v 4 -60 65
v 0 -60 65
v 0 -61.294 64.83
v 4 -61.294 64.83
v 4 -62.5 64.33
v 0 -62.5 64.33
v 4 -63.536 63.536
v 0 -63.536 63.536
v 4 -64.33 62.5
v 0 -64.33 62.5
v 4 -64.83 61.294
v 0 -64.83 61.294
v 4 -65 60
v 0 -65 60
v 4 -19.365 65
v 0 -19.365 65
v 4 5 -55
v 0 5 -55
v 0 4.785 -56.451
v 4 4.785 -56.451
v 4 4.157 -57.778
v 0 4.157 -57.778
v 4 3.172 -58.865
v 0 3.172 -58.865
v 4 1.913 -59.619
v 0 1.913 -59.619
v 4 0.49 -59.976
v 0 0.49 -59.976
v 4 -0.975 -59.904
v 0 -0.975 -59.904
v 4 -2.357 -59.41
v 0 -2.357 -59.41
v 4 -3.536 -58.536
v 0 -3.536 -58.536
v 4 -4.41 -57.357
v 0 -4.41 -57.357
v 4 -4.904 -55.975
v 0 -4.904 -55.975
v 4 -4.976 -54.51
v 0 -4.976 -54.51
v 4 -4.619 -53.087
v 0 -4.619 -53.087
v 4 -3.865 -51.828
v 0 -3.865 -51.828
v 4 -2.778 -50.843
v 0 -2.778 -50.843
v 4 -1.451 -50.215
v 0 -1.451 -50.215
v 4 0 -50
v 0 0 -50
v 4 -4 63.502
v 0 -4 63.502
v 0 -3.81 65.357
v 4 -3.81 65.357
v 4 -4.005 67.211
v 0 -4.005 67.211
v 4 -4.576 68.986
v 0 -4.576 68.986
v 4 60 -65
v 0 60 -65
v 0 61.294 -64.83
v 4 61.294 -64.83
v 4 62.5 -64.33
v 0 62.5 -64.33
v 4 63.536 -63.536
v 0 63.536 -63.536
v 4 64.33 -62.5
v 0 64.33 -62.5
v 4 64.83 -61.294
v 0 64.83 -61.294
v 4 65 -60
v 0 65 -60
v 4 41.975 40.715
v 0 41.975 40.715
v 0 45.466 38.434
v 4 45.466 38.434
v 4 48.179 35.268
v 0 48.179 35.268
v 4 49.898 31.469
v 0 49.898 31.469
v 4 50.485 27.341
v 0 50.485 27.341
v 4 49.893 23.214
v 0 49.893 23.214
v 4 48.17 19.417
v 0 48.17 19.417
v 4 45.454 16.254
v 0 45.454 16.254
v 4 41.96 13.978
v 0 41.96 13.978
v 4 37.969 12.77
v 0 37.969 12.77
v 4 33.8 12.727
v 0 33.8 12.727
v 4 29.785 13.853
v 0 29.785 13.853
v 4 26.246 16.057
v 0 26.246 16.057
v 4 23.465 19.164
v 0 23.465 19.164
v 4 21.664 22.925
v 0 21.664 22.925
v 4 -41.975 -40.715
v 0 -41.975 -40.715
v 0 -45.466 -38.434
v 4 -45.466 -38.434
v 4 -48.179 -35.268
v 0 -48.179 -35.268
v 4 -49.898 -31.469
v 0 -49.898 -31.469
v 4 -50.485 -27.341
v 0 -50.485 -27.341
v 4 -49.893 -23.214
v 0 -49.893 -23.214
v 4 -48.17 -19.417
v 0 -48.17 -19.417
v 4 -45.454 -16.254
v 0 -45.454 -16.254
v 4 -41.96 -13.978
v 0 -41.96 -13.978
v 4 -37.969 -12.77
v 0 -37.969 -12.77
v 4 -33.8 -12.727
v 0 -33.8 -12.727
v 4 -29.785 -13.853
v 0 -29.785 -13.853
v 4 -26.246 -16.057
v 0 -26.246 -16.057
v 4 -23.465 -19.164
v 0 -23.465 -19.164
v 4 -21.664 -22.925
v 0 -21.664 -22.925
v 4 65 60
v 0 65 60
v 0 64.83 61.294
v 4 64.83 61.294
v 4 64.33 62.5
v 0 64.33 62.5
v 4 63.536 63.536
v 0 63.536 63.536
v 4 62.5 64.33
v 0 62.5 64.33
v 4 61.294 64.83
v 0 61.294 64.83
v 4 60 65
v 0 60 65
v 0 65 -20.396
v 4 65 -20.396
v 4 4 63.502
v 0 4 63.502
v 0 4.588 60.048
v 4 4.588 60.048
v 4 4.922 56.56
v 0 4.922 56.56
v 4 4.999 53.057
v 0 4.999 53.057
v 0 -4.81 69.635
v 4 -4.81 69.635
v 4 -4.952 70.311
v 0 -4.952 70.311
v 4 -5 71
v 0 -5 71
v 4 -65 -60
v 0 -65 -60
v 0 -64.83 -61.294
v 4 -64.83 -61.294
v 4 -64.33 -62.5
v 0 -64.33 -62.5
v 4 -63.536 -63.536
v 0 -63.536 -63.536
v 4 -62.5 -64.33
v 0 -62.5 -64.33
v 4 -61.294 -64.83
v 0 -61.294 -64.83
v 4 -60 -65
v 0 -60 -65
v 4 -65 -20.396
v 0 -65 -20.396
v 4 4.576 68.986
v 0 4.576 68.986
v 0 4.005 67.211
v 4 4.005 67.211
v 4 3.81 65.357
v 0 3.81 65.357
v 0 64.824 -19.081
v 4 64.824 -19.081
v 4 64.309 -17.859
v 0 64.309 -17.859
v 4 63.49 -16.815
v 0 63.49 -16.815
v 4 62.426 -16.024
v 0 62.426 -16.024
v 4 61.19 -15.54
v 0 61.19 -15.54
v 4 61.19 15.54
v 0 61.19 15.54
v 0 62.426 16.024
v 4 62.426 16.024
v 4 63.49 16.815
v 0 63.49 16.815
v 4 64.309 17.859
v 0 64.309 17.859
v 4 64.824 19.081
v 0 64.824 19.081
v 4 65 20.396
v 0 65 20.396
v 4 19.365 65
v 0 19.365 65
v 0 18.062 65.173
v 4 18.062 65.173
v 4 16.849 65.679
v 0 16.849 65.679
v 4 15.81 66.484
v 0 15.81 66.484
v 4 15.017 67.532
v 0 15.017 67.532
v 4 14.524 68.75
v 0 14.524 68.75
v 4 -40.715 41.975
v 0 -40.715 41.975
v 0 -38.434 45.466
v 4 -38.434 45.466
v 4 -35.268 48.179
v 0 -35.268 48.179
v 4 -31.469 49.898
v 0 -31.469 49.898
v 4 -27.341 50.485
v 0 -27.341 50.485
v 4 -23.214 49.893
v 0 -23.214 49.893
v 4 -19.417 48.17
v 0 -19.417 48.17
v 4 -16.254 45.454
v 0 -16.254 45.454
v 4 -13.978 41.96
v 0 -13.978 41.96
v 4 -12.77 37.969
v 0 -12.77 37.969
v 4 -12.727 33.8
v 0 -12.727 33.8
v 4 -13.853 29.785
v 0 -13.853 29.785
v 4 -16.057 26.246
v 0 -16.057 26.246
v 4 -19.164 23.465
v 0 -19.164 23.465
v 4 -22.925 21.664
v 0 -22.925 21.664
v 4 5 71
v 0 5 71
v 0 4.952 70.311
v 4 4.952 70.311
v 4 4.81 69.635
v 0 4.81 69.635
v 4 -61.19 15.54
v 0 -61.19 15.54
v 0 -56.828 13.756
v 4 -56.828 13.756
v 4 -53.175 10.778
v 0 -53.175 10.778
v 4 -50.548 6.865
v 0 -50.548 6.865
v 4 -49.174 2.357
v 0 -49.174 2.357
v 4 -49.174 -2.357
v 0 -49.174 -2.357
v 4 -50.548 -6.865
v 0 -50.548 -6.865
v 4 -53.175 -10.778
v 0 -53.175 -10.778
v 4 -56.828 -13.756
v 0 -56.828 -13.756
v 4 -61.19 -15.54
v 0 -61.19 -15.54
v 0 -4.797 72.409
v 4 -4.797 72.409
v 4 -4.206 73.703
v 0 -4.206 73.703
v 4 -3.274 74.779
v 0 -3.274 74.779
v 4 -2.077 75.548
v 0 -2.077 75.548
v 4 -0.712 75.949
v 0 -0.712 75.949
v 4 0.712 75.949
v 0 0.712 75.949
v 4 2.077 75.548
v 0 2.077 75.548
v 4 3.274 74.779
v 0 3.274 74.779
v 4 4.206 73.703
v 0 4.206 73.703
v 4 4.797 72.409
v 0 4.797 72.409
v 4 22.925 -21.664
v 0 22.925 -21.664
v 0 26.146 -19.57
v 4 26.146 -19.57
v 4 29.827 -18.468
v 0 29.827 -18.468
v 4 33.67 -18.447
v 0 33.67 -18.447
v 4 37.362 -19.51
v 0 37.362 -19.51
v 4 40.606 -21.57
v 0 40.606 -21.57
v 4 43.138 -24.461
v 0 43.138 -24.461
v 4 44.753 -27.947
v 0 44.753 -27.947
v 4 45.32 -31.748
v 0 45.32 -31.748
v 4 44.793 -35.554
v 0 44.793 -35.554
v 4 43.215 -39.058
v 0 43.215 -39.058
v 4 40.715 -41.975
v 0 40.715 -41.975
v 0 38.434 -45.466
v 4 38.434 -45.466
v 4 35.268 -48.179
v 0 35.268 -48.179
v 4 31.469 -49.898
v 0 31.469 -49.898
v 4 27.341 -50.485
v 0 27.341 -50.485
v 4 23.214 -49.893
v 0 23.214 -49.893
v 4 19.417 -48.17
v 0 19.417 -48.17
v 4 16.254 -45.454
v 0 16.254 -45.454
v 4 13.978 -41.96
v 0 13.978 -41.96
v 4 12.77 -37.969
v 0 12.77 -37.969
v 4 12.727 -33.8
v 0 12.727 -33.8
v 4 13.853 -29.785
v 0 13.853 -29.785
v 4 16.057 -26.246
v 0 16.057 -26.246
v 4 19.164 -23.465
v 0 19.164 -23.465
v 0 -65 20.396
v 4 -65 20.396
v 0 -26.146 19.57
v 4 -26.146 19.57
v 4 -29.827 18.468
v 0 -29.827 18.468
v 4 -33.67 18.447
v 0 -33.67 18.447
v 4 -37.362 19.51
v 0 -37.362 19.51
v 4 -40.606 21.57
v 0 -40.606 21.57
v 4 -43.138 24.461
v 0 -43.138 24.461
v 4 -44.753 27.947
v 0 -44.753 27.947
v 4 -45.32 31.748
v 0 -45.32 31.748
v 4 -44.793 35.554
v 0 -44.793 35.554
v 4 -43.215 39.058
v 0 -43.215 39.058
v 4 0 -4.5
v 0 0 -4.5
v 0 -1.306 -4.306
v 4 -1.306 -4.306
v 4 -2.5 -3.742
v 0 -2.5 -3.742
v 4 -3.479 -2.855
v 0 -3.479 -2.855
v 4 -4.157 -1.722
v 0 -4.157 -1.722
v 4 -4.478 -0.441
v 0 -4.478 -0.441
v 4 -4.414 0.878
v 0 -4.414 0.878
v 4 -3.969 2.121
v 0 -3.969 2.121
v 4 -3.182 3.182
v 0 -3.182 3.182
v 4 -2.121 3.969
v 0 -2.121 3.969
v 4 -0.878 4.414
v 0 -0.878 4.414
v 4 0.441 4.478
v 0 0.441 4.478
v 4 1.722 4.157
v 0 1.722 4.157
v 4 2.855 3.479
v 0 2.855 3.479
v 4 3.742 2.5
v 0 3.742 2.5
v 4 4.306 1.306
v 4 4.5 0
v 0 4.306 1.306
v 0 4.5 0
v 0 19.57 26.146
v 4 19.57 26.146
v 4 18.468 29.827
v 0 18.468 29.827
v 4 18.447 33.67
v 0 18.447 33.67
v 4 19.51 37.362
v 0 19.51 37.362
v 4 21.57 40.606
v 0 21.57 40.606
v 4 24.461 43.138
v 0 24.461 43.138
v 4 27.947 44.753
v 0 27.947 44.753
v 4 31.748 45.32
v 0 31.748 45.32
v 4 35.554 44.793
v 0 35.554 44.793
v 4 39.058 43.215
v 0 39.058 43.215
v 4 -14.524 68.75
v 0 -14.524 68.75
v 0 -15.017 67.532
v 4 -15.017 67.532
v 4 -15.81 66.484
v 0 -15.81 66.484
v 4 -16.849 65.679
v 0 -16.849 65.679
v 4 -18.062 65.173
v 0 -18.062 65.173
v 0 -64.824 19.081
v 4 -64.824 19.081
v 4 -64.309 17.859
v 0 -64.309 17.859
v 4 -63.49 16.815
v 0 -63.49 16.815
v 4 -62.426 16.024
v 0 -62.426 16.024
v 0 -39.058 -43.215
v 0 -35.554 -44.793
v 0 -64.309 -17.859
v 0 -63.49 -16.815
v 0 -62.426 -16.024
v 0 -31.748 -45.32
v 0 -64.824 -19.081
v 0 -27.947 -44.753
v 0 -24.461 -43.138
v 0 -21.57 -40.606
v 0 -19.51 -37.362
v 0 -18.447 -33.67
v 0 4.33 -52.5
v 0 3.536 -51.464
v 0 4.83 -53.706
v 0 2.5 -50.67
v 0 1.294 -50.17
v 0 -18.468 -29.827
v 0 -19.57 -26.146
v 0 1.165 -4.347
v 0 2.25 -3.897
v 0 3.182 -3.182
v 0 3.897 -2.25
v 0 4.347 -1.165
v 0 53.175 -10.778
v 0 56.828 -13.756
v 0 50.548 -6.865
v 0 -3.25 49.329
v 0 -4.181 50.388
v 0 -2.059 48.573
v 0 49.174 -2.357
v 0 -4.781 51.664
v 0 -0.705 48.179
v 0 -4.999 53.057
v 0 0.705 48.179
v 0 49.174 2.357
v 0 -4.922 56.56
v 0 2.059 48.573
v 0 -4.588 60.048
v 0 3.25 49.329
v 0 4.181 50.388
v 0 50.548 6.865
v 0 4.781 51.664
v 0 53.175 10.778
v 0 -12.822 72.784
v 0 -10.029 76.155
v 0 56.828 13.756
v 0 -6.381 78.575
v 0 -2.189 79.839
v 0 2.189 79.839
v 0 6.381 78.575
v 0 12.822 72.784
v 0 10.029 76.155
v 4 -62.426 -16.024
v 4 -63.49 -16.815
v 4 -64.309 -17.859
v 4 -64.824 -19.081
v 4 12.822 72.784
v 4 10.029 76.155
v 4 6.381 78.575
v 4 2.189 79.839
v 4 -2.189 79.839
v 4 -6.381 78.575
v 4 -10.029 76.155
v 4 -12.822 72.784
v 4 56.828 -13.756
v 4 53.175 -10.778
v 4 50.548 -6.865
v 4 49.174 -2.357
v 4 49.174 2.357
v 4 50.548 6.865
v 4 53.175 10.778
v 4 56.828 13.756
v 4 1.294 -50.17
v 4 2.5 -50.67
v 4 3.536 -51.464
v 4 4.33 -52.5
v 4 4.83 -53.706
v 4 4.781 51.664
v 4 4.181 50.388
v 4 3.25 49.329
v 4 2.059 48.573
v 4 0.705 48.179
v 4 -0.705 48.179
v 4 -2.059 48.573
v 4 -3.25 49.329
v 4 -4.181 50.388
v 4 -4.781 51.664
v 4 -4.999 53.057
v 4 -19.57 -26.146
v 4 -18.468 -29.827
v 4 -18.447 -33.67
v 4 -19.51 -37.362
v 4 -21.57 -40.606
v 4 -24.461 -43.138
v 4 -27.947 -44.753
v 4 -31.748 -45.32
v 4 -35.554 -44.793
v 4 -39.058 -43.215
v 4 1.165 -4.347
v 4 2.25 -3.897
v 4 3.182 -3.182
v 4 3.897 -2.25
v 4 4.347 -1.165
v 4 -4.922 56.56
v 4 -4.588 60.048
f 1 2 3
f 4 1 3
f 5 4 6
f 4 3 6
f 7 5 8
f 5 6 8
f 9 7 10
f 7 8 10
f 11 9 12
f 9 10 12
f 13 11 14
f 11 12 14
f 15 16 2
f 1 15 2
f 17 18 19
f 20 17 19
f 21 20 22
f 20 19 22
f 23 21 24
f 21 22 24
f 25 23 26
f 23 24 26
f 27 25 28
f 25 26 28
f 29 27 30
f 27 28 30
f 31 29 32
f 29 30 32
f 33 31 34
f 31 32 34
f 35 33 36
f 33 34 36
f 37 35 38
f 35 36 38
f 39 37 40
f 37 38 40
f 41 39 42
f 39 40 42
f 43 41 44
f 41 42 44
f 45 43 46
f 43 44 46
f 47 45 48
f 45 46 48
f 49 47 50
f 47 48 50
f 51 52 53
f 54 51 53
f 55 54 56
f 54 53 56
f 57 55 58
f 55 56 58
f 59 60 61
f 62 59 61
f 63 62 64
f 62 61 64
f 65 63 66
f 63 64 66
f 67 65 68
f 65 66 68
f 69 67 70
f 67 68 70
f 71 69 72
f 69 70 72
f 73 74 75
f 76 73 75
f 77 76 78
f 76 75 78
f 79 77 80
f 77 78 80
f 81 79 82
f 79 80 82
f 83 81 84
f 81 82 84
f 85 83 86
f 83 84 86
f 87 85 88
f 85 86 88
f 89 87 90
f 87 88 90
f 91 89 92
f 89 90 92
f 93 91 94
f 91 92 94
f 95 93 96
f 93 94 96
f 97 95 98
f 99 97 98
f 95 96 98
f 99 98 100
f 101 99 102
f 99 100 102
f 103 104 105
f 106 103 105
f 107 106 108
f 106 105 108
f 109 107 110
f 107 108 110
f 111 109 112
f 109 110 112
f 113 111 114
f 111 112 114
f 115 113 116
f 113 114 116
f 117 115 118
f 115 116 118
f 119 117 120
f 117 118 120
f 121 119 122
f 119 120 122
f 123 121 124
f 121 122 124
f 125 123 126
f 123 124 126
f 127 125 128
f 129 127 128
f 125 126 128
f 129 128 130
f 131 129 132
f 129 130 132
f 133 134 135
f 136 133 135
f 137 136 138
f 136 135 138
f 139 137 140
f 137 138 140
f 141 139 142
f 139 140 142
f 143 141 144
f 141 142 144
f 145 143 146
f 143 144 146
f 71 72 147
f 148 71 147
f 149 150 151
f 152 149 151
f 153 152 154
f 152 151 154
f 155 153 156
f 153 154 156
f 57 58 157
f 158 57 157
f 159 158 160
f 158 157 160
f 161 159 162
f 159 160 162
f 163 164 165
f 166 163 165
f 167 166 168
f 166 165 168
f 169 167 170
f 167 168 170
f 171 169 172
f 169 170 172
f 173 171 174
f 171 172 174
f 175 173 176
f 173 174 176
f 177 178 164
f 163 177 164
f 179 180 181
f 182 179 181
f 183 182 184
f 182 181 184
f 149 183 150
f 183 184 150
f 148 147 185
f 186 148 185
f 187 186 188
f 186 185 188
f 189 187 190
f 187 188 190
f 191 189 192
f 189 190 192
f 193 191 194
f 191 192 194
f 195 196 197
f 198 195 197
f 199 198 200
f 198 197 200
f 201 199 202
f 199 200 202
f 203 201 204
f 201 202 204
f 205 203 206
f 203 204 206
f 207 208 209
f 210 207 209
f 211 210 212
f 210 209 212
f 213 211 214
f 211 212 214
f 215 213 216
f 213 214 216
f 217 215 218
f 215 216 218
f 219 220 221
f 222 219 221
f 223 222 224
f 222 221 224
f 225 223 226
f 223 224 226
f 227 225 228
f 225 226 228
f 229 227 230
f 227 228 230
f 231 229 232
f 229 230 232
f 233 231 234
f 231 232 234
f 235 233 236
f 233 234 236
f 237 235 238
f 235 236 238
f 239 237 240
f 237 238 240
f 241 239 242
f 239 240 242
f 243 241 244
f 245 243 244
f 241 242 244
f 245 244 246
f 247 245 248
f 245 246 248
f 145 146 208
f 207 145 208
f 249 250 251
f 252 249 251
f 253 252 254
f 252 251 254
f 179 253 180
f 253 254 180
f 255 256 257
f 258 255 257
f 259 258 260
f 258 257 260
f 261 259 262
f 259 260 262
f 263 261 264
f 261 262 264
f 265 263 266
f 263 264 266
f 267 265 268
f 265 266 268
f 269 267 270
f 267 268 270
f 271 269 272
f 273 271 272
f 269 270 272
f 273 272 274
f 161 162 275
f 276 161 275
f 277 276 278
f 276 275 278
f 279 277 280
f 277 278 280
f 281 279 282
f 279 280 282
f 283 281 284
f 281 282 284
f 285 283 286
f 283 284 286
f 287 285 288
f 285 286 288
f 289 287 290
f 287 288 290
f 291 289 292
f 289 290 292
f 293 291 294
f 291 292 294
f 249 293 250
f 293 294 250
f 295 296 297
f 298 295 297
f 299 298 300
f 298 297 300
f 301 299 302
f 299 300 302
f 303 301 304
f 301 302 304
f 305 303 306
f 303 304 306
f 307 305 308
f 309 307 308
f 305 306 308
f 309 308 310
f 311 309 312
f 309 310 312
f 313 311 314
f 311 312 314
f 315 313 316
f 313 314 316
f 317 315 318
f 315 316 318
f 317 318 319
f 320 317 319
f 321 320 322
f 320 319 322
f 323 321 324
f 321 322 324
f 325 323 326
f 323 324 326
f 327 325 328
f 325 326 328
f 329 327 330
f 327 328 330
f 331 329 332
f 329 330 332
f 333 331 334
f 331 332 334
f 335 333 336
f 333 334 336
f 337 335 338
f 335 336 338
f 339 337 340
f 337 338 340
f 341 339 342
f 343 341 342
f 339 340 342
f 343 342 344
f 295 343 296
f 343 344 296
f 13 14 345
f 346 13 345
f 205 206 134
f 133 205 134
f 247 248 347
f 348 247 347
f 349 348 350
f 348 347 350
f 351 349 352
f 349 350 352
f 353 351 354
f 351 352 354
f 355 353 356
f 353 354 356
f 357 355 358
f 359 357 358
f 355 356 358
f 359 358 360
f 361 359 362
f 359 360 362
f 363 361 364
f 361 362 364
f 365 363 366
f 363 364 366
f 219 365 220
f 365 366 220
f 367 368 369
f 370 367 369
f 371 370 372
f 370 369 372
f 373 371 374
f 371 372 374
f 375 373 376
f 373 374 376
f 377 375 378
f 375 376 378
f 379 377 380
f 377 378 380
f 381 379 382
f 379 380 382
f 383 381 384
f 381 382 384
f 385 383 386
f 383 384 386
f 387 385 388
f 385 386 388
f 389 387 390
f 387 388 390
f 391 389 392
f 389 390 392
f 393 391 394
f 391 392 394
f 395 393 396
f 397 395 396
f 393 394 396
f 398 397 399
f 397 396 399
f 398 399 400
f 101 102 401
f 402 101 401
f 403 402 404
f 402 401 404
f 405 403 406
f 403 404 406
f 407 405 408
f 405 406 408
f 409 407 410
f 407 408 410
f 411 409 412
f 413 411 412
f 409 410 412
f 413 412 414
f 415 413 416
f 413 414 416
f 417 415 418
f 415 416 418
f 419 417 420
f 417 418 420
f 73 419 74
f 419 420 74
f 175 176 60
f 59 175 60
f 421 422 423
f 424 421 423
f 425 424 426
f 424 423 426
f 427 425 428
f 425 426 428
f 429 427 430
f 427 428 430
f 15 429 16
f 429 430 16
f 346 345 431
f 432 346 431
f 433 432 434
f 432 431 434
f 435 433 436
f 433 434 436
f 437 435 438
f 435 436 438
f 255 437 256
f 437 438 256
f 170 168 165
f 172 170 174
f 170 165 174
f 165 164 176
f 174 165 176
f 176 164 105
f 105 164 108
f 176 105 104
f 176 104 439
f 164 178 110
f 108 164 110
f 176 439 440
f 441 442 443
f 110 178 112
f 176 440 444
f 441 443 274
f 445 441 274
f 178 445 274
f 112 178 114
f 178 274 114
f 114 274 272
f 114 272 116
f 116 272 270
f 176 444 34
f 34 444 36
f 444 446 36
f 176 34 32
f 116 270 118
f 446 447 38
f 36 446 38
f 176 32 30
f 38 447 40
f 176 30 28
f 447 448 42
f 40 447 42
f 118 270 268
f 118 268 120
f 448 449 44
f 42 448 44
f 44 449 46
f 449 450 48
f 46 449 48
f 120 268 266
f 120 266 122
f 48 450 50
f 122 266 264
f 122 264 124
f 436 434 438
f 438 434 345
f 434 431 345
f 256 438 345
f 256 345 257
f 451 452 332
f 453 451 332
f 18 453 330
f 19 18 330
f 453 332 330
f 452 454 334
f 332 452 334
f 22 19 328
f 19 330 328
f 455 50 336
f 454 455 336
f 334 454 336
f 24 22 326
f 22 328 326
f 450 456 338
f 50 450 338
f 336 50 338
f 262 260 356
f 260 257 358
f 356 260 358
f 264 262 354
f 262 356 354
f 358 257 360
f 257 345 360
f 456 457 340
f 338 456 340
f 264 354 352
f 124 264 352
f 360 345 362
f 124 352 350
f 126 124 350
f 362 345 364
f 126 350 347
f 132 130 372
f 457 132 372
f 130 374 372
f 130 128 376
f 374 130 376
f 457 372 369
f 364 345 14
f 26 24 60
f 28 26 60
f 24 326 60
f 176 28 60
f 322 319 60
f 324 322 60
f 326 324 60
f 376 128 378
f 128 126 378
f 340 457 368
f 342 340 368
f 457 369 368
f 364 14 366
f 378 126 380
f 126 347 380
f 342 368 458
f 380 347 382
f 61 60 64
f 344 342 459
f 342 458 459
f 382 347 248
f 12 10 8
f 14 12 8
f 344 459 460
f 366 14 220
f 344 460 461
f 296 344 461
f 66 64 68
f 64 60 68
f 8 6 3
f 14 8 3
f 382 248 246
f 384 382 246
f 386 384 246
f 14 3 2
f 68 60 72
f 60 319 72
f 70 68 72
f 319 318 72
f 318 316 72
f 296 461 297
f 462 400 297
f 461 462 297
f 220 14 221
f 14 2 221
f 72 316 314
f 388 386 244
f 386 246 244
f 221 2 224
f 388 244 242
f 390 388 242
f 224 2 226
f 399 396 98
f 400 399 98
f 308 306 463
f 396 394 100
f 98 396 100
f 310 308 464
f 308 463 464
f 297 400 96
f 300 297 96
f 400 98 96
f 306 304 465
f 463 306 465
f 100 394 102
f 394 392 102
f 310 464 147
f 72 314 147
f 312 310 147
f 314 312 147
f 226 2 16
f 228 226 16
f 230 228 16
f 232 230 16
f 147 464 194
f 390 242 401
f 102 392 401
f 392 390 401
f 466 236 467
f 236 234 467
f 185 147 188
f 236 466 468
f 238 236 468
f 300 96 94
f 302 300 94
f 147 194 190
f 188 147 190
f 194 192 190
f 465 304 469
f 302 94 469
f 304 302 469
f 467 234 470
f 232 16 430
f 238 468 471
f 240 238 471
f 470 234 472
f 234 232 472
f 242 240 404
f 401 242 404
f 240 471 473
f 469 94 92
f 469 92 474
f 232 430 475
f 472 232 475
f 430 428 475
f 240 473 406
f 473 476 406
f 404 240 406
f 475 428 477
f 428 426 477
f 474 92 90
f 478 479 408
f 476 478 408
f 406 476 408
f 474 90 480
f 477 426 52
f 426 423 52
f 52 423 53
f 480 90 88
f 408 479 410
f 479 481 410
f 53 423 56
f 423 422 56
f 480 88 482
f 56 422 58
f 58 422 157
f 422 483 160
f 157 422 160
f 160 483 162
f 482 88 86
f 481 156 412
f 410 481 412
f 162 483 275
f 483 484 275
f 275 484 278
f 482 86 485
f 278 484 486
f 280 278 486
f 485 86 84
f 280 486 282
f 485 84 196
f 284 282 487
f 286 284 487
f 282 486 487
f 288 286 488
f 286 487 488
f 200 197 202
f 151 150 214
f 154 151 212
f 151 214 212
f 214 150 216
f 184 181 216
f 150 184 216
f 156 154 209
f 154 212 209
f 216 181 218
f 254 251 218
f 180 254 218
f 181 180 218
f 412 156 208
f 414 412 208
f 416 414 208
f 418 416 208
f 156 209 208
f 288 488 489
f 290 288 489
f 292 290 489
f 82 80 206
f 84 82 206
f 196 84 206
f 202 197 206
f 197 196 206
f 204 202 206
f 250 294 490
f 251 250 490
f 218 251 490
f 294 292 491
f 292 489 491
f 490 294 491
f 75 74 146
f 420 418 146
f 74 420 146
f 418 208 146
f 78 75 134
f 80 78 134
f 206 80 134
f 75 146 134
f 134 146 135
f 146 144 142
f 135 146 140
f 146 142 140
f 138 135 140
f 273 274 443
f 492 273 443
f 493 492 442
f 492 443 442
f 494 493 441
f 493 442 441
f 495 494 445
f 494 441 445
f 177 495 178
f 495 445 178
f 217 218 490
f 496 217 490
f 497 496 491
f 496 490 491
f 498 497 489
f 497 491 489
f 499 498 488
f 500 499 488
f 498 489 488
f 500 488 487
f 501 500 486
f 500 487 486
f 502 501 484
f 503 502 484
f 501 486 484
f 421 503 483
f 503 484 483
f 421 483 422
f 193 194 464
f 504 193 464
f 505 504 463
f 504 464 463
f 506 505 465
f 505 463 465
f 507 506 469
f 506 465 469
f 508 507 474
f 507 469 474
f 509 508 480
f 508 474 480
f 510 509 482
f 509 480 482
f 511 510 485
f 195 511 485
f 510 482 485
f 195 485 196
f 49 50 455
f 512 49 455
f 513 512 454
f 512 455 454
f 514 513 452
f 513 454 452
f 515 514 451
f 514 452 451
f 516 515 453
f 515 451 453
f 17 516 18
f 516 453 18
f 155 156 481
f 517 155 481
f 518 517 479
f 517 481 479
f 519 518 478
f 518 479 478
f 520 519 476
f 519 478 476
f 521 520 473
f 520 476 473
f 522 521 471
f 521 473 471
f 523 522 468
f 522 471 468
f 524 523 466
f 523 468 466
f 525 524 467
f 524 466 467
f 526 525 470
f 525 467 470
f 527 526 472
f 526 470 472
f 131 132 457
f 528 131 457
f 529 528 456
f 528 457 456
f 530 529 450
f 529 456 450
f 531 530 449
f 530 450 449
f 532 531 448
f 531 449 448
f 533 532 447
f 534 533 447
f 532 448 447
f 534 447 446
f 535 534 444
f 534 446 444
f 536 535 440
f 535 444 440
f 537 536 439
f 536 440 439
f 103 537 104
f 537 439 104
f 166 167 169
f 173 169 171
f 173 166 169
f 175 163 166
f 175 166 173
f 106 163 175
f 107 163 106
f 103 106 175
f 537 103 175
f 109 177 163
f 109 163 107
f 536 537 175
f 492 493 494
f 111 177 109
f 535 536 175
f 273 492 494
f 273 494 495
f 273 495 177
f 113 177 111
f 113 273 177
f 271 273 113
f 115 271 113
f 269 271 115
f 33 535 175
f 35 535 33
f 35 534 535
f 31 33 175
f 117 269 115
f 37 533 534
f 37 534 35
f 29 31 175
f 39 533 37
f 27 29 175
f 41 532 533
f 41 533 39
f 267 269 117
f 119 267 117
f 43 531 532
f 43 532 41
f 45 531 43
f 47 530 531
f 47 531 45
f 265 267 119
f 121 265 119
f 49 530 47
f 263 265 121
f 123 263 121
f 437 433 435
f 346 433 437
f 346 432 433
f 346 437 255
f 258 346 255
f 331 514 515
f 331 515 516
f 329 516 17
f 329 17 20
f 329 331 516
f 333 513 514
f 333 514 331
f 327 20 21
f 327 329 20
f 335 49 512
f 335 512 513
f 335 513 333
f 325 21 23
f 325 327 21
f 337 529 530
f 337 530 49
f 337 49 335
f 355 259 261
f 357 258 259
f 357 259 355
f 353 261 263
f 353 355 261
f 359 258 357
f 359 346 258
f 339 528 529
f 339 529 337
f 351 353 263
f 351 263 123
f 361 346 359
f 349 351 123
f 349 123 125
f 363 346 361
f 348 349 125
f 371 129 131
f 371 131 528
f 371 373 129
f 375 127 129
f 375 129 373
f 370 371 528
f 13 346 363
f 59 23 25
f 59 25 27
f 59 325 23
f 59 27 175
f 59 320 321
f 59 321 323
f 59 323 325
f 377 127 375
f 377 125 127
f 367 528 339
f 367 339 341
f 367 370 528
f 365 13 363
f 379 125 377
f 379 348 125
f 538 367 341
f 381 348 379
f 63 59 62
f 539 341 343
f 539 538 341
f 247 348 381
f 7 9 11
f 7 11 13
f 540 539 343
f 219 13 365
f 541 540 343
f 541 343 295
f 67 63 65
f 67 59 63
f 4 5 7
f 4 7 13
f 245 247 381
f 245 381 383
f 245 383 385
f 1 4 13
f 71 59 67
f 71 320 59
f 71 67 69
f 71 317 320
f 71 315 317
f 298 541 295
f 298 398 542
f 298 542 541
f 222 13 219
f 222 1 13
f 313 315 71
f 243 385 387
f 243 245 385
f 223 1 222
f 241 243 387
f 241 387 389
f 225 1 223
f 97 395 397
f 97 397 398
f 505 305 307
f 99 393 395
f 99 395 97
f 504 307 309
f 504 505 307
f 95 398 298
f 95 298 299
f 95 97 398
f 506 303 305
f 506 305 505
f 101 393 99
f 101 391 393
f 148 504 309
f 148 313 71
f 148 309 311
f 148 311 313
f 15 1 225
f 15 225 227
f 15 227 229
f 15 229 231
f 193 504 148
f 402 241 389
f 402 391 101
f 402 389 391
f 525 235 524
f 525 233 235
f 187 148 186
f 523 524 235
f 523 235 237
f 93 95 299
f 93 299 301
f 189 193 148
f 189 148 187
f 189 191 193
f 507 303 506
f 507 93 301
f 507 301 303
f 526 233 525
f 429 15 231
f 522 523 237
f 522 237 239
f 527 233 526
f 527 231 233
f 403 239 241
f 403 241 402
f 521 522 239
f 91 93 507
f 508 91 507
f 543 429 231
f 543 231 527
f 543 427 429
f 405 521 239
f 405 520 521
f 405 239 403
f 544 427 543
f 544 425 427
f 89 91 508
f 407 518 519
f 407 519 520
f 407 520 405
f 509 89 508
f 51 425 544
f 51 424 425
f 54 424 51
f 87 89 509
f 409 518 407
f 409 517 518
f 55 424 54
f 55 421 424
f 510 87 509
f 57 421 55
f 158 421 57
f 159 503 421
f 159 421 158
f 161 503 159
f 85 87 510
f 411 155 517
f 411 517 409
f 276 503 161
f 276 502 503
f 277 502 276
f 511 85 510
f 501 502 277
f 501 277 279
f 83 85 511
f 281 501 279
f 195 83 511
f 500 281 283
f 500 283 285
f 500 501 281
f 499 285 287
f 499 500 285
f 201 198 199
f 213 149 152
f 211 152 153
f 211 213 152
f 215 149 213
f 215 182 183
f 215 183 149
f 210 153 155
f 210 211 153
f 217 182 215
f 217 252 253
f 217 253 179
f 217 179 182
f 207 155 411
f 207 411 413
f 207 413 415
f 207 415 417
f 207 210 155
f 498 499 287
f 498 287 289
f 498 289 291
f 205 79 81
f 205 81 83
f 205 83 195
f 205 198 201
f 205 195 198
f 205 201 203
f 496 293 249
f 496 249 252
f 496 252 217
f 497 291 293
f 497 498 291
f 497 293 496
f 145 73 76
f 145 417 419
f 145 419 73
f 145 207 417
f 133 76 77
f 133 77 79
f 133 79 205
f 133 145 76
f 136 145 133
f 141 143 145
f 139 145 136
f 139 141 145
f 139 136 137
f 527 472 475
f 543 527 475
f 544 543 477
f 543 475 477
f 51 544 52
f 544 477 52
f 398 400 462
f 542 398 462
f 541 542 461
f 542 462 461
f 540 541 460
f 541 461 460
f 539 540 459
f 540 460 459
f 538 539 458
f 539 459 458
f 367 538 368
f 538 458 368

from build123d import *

# Parameters (mm, degrees)
F1_DEPTH = 4


with BuildPart() as f1:
    # F0 (on Right) → F1 (new body)
    with BuildSketch(Plane.YZ):
        with BuildLine():
            Line((-19.364917, 65), (-60, 65))
            ThreePointArc((-60, 65), (-63.535534, 63.535534), (-65, 60))
            Line((-65, 60), (-65, 20.396078))
            ThreePointArc((-65, 20.396078), (-63.933979, 17.310011), (-61.190476, 15.539869))
            ThreePointArc((-61.190476, 15.539869), (-49, 0), (-61.190476, -15.539869))
            ThreePointArc((-61.190476, -15.539869), (-63.933979, -17.310011), (-65, -20.396078))
            Line((-65, -20.396078), (-65, -60))
            ThreePointArc((-65, -60), (-63.535534, -63.535534), (-60, -65))
            Line((-60, -65), (60, -65))
            ThreePointArc((60, -65), (63.535534, -63.535534), (65, -60))
            Line((65, -60), (65, -20.396078))
            ThreePointArc((65, -20.396078), (63.933979, -17.310011), (61.190476, -15.539869))
            ThreePointArc((61.190476, -15.539869), (49, 0), (61.190476, 15.539869))
            ThreePointArc((61.190476, 15.539869), (63.933979, 17.310011), (65, 20.396078))
            Line((65, 20.396078), (65, 60))
            ThreePointArc((65, 60), (63.535534, 63.535534), (60, 65))
            Line((60, 65), (19.364917, 65))
            ThreePointArc((19.364917, 65), (16.303055, 66.047153), (14.523688, 68.75))
            ThreePointArc((14.523688, 68.75), (0, 80), (-14.523688, 68.75))
            ThreePointArc((-14.523688, 68.75), (-16.303055, 66.047153), (-19.364917, 65))
        make_face()
        with BuildLine():
            ThreePointArc((-21.664404, -22.924985), (-22.924985, -41.975206), (-41.975206, -40.714626))
            ThreePointArc((-41.975206, -40.714626), (-45.453544, -16.253883), (-21.664404, -22.924985))
        make_face(mode=Mode.SUBTRACT)
        with BuildLine():
            ThreePointArc((5, -55), (-3.535534, -58.535534), (0, -50))
            ThreePointArc((0, -50), (3.535534, -51.464466), (5, -55))
        make_face(mode=Mode.SUBTRACT)
        with BuildLine():
            ThreePointArc((22.924985, -21.664404), (41.975206, -22.924985), (40.714626, -41.975206))
            ThreePointArc((40.714626, -41.975206), (16.253883, -45.453544), (22.924985, -21.664404))
        make_face(mode=Mode.SUBTRACT)
        with BuildLine():
            ThreePointArc((0, -4.5), (-3.181981, 3.181981), (4.5, 0))
            ThreePointArc((4.5, 0), (3.181981, -3.181981), (0, -4.5))
        make_face(mode=Mode.SUBTRACT)
        with BuildLine():
            ThreePointArc((-22.924985, 21.664404), (-41.975206, 22.924985), (-40.714626, 41.975206))
            ThreePointArc((-40.714626, 41.975206), (-16.253883, 45.453544), (-22.924985, 21.664404))
        make_face(mode=Mode.SUBTRACT)
        with BuildLine():
            ThreePointArc((21.664404, 22.924985), (22.924985, 41.975206), (41.975206, 40.714626))
            ThreePointArc((41.975206, 40.714626), (45.453544, 16.253883), (21.664404, 22.924985))
        make_face(mode=Mode.SUBTRACT)
        with BuildLine():
            ThreePointArc((-5, 71), (0, 76), (5, 71))
            ThreePointArc((5, 71), (4.892932, 69.97082), (4.576315, 68.985716))
            ThreePointArc((4.576315, 68.985716), (3.859883, 66.289083), (4, 63.502423))
            ThreePointArc((4, 63.502423), (4.786744, 58.307337), (4.999482, 53.057325))
            ThreePointArc((4.999482, 53.057325), (0, 48.129323), (-4.999482, 53.057325))
            ThreePointArc((-4.999482, 53.057325), (-4.786744, 58.307337), (-4, 63.502423))
            ThreePointArc((-4, 63.502423), (-3.859883, 66.289083), (-4.576315, 68.985716))
            ThreePointArc((-4.576315, 68.985716), (-4.892932, 69.97082), (-5, 71))
        make_face(mode=Mode.SUBTRACT)
    extrude(amount=F1_DEPTH)


solid = f1.part
